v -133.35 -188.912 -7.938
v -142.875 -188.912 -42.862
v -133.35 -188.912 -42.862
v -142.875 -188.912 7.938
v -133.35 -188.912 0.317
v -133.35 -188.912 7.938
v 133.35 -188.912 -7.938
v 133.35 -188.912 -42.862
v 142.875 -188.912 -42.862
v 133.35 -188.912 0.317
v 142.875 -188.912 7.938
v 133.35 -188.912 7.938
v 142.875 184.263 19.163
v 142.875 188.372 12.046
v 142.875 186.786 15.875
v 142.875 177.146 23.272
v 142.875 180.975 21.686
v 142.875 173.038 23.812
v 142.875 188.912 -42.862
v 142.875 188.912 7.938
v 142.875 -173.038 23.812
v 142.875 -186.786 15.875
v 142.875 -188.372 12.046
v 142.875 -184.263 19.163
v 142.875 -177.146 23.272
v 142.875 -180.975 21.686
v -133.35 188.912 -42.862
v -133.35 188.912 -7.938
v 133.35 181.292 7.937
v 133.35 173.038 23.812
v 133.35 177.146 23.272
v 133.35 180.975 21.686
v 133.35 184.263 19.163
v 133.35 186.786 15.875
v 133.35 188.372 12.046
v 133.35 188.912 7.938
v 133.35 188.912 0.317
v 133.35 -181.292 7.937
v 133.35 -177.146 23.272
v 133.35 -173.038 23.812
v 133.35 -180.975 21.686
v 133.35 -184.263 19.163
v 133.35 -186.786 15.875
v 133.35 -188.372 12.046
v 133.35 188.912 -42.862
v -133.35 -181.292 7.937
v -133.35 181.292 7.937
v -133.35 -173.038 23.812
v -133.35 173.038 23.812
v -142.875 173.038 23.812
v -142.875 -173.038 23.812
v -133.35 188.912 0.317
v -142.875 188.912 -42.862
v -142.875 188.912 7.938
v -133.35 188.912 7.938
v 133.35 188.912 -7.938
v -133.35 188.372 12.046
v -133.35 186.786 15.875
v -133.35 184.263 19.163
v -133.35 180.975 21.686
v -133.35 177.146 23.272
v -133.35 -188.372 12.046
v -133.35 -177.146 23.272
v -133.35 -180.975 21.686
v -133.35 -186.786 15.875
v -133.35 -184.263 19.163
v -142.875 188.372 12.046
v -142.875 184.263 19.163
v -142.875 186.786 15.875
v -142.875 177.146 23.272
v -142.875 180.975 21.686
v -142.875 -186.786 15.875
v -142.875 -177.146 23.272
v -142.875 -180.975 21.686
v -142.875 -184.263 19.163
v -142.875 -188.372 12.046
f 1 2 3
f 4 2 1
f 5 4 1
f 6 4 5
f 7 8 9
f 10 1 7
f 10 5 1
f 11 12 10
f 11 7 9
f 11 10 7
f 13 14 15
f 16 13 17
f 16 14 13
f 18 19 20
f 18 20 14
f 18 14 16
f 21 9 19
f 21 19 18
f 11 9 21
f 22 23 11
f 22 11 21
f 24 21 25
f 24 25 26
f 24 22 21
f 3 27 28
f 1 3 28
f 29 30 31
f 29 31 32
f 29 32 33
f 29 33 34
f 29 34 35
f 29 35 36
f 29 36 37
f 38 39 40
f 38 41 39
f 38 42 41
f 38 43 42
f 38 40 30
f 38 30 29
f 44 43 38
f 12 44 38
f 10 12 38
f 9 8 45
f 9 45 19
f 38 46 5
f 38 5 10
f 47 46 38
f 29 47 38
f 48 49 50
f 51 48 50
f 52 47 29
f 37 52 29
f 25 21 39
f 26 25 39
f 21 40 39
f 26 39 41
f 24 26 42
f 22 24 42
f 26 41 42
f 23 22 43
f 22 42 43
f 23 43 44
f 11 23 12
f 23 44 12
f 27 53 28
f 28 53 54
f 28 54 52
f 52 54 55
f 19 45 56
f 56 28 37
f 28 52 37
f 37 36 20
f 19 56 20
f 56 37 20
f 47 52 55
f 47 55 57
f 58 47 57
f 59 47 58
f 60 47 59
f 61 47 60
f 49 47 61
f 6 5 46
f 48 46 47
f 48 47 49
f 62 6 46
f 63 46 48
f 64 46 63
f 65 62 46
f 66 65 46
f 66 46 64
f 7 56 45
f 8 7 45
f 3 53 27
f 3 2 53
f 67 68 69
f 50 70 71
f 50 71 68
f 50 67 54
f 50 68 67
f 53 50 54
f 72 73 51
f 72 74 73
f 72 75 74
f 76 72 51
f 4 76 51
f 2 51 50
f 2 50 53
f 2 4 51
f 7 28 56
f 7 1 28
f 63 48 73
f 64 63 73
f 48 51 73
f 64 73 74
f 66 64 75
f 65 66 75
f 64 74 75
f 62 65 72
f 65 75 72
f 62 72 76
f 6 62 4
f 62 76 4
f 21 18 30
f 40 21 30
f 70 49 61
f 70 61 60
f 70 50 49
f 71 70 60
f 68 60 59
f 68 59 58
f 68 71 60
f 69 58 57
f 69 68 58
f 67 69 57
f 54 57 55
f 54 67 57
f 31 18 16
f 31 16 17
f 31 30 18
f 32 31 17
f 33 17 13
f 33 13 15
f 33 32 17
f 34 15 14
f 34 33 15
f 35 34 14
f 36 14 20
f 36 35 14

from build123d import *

# Parameters (mm, degrees)
F0_W     = 266.7
F0_H     = 15.875
F1_DEPTH = 188.9125
F2_R     = 15.875
F3_SIZE  = 7.62


with BuildPart() as f1:
    # F0 (on Front) → F1 (new body, symmetric)
    with BuildSketch(Plane.XZ):
        Rectangle(F0_W, F0_H)
        Polygon((133.35, 23.8125), (133.35, 7.9375), (133.35, -7.9375), (133.35, -42.8625), (142.875, -42.8625), (142.875, 23.8125), align=None)
        Polygon((-133.35, -7.9375), (-133.35, 7.9375), (-133.35, 23.8125), (-142.875, 23.8125), (-142.875, -42.8625), (-133.35, -42.8625), align=None)
    extrude(amount=F1_DEPTH, both=True)

    # F2
    f2_edges = [f1.edges().sort_by_distance(p)[0] for p in [
        (-138.1125, -188.9125, 23.8125),
        (-138.1125, 188.9125, 23.8125),
        (138.1125, 188.9125, 23.8125),
        (138.1125, -188.9125, 23.8125),
    ]]
    fillet(f2_edges, radius=F2_R)

    # F3
    f3_edges = [f1.edges().sort_by_distance(p)[0] for p in [
        (0, -188.9125, 7.9375),
        (0, 188.9125, 7.9375),
    ]]
    chamfer(f3_edges, length=F3_SIZE)


solid = f1.part
